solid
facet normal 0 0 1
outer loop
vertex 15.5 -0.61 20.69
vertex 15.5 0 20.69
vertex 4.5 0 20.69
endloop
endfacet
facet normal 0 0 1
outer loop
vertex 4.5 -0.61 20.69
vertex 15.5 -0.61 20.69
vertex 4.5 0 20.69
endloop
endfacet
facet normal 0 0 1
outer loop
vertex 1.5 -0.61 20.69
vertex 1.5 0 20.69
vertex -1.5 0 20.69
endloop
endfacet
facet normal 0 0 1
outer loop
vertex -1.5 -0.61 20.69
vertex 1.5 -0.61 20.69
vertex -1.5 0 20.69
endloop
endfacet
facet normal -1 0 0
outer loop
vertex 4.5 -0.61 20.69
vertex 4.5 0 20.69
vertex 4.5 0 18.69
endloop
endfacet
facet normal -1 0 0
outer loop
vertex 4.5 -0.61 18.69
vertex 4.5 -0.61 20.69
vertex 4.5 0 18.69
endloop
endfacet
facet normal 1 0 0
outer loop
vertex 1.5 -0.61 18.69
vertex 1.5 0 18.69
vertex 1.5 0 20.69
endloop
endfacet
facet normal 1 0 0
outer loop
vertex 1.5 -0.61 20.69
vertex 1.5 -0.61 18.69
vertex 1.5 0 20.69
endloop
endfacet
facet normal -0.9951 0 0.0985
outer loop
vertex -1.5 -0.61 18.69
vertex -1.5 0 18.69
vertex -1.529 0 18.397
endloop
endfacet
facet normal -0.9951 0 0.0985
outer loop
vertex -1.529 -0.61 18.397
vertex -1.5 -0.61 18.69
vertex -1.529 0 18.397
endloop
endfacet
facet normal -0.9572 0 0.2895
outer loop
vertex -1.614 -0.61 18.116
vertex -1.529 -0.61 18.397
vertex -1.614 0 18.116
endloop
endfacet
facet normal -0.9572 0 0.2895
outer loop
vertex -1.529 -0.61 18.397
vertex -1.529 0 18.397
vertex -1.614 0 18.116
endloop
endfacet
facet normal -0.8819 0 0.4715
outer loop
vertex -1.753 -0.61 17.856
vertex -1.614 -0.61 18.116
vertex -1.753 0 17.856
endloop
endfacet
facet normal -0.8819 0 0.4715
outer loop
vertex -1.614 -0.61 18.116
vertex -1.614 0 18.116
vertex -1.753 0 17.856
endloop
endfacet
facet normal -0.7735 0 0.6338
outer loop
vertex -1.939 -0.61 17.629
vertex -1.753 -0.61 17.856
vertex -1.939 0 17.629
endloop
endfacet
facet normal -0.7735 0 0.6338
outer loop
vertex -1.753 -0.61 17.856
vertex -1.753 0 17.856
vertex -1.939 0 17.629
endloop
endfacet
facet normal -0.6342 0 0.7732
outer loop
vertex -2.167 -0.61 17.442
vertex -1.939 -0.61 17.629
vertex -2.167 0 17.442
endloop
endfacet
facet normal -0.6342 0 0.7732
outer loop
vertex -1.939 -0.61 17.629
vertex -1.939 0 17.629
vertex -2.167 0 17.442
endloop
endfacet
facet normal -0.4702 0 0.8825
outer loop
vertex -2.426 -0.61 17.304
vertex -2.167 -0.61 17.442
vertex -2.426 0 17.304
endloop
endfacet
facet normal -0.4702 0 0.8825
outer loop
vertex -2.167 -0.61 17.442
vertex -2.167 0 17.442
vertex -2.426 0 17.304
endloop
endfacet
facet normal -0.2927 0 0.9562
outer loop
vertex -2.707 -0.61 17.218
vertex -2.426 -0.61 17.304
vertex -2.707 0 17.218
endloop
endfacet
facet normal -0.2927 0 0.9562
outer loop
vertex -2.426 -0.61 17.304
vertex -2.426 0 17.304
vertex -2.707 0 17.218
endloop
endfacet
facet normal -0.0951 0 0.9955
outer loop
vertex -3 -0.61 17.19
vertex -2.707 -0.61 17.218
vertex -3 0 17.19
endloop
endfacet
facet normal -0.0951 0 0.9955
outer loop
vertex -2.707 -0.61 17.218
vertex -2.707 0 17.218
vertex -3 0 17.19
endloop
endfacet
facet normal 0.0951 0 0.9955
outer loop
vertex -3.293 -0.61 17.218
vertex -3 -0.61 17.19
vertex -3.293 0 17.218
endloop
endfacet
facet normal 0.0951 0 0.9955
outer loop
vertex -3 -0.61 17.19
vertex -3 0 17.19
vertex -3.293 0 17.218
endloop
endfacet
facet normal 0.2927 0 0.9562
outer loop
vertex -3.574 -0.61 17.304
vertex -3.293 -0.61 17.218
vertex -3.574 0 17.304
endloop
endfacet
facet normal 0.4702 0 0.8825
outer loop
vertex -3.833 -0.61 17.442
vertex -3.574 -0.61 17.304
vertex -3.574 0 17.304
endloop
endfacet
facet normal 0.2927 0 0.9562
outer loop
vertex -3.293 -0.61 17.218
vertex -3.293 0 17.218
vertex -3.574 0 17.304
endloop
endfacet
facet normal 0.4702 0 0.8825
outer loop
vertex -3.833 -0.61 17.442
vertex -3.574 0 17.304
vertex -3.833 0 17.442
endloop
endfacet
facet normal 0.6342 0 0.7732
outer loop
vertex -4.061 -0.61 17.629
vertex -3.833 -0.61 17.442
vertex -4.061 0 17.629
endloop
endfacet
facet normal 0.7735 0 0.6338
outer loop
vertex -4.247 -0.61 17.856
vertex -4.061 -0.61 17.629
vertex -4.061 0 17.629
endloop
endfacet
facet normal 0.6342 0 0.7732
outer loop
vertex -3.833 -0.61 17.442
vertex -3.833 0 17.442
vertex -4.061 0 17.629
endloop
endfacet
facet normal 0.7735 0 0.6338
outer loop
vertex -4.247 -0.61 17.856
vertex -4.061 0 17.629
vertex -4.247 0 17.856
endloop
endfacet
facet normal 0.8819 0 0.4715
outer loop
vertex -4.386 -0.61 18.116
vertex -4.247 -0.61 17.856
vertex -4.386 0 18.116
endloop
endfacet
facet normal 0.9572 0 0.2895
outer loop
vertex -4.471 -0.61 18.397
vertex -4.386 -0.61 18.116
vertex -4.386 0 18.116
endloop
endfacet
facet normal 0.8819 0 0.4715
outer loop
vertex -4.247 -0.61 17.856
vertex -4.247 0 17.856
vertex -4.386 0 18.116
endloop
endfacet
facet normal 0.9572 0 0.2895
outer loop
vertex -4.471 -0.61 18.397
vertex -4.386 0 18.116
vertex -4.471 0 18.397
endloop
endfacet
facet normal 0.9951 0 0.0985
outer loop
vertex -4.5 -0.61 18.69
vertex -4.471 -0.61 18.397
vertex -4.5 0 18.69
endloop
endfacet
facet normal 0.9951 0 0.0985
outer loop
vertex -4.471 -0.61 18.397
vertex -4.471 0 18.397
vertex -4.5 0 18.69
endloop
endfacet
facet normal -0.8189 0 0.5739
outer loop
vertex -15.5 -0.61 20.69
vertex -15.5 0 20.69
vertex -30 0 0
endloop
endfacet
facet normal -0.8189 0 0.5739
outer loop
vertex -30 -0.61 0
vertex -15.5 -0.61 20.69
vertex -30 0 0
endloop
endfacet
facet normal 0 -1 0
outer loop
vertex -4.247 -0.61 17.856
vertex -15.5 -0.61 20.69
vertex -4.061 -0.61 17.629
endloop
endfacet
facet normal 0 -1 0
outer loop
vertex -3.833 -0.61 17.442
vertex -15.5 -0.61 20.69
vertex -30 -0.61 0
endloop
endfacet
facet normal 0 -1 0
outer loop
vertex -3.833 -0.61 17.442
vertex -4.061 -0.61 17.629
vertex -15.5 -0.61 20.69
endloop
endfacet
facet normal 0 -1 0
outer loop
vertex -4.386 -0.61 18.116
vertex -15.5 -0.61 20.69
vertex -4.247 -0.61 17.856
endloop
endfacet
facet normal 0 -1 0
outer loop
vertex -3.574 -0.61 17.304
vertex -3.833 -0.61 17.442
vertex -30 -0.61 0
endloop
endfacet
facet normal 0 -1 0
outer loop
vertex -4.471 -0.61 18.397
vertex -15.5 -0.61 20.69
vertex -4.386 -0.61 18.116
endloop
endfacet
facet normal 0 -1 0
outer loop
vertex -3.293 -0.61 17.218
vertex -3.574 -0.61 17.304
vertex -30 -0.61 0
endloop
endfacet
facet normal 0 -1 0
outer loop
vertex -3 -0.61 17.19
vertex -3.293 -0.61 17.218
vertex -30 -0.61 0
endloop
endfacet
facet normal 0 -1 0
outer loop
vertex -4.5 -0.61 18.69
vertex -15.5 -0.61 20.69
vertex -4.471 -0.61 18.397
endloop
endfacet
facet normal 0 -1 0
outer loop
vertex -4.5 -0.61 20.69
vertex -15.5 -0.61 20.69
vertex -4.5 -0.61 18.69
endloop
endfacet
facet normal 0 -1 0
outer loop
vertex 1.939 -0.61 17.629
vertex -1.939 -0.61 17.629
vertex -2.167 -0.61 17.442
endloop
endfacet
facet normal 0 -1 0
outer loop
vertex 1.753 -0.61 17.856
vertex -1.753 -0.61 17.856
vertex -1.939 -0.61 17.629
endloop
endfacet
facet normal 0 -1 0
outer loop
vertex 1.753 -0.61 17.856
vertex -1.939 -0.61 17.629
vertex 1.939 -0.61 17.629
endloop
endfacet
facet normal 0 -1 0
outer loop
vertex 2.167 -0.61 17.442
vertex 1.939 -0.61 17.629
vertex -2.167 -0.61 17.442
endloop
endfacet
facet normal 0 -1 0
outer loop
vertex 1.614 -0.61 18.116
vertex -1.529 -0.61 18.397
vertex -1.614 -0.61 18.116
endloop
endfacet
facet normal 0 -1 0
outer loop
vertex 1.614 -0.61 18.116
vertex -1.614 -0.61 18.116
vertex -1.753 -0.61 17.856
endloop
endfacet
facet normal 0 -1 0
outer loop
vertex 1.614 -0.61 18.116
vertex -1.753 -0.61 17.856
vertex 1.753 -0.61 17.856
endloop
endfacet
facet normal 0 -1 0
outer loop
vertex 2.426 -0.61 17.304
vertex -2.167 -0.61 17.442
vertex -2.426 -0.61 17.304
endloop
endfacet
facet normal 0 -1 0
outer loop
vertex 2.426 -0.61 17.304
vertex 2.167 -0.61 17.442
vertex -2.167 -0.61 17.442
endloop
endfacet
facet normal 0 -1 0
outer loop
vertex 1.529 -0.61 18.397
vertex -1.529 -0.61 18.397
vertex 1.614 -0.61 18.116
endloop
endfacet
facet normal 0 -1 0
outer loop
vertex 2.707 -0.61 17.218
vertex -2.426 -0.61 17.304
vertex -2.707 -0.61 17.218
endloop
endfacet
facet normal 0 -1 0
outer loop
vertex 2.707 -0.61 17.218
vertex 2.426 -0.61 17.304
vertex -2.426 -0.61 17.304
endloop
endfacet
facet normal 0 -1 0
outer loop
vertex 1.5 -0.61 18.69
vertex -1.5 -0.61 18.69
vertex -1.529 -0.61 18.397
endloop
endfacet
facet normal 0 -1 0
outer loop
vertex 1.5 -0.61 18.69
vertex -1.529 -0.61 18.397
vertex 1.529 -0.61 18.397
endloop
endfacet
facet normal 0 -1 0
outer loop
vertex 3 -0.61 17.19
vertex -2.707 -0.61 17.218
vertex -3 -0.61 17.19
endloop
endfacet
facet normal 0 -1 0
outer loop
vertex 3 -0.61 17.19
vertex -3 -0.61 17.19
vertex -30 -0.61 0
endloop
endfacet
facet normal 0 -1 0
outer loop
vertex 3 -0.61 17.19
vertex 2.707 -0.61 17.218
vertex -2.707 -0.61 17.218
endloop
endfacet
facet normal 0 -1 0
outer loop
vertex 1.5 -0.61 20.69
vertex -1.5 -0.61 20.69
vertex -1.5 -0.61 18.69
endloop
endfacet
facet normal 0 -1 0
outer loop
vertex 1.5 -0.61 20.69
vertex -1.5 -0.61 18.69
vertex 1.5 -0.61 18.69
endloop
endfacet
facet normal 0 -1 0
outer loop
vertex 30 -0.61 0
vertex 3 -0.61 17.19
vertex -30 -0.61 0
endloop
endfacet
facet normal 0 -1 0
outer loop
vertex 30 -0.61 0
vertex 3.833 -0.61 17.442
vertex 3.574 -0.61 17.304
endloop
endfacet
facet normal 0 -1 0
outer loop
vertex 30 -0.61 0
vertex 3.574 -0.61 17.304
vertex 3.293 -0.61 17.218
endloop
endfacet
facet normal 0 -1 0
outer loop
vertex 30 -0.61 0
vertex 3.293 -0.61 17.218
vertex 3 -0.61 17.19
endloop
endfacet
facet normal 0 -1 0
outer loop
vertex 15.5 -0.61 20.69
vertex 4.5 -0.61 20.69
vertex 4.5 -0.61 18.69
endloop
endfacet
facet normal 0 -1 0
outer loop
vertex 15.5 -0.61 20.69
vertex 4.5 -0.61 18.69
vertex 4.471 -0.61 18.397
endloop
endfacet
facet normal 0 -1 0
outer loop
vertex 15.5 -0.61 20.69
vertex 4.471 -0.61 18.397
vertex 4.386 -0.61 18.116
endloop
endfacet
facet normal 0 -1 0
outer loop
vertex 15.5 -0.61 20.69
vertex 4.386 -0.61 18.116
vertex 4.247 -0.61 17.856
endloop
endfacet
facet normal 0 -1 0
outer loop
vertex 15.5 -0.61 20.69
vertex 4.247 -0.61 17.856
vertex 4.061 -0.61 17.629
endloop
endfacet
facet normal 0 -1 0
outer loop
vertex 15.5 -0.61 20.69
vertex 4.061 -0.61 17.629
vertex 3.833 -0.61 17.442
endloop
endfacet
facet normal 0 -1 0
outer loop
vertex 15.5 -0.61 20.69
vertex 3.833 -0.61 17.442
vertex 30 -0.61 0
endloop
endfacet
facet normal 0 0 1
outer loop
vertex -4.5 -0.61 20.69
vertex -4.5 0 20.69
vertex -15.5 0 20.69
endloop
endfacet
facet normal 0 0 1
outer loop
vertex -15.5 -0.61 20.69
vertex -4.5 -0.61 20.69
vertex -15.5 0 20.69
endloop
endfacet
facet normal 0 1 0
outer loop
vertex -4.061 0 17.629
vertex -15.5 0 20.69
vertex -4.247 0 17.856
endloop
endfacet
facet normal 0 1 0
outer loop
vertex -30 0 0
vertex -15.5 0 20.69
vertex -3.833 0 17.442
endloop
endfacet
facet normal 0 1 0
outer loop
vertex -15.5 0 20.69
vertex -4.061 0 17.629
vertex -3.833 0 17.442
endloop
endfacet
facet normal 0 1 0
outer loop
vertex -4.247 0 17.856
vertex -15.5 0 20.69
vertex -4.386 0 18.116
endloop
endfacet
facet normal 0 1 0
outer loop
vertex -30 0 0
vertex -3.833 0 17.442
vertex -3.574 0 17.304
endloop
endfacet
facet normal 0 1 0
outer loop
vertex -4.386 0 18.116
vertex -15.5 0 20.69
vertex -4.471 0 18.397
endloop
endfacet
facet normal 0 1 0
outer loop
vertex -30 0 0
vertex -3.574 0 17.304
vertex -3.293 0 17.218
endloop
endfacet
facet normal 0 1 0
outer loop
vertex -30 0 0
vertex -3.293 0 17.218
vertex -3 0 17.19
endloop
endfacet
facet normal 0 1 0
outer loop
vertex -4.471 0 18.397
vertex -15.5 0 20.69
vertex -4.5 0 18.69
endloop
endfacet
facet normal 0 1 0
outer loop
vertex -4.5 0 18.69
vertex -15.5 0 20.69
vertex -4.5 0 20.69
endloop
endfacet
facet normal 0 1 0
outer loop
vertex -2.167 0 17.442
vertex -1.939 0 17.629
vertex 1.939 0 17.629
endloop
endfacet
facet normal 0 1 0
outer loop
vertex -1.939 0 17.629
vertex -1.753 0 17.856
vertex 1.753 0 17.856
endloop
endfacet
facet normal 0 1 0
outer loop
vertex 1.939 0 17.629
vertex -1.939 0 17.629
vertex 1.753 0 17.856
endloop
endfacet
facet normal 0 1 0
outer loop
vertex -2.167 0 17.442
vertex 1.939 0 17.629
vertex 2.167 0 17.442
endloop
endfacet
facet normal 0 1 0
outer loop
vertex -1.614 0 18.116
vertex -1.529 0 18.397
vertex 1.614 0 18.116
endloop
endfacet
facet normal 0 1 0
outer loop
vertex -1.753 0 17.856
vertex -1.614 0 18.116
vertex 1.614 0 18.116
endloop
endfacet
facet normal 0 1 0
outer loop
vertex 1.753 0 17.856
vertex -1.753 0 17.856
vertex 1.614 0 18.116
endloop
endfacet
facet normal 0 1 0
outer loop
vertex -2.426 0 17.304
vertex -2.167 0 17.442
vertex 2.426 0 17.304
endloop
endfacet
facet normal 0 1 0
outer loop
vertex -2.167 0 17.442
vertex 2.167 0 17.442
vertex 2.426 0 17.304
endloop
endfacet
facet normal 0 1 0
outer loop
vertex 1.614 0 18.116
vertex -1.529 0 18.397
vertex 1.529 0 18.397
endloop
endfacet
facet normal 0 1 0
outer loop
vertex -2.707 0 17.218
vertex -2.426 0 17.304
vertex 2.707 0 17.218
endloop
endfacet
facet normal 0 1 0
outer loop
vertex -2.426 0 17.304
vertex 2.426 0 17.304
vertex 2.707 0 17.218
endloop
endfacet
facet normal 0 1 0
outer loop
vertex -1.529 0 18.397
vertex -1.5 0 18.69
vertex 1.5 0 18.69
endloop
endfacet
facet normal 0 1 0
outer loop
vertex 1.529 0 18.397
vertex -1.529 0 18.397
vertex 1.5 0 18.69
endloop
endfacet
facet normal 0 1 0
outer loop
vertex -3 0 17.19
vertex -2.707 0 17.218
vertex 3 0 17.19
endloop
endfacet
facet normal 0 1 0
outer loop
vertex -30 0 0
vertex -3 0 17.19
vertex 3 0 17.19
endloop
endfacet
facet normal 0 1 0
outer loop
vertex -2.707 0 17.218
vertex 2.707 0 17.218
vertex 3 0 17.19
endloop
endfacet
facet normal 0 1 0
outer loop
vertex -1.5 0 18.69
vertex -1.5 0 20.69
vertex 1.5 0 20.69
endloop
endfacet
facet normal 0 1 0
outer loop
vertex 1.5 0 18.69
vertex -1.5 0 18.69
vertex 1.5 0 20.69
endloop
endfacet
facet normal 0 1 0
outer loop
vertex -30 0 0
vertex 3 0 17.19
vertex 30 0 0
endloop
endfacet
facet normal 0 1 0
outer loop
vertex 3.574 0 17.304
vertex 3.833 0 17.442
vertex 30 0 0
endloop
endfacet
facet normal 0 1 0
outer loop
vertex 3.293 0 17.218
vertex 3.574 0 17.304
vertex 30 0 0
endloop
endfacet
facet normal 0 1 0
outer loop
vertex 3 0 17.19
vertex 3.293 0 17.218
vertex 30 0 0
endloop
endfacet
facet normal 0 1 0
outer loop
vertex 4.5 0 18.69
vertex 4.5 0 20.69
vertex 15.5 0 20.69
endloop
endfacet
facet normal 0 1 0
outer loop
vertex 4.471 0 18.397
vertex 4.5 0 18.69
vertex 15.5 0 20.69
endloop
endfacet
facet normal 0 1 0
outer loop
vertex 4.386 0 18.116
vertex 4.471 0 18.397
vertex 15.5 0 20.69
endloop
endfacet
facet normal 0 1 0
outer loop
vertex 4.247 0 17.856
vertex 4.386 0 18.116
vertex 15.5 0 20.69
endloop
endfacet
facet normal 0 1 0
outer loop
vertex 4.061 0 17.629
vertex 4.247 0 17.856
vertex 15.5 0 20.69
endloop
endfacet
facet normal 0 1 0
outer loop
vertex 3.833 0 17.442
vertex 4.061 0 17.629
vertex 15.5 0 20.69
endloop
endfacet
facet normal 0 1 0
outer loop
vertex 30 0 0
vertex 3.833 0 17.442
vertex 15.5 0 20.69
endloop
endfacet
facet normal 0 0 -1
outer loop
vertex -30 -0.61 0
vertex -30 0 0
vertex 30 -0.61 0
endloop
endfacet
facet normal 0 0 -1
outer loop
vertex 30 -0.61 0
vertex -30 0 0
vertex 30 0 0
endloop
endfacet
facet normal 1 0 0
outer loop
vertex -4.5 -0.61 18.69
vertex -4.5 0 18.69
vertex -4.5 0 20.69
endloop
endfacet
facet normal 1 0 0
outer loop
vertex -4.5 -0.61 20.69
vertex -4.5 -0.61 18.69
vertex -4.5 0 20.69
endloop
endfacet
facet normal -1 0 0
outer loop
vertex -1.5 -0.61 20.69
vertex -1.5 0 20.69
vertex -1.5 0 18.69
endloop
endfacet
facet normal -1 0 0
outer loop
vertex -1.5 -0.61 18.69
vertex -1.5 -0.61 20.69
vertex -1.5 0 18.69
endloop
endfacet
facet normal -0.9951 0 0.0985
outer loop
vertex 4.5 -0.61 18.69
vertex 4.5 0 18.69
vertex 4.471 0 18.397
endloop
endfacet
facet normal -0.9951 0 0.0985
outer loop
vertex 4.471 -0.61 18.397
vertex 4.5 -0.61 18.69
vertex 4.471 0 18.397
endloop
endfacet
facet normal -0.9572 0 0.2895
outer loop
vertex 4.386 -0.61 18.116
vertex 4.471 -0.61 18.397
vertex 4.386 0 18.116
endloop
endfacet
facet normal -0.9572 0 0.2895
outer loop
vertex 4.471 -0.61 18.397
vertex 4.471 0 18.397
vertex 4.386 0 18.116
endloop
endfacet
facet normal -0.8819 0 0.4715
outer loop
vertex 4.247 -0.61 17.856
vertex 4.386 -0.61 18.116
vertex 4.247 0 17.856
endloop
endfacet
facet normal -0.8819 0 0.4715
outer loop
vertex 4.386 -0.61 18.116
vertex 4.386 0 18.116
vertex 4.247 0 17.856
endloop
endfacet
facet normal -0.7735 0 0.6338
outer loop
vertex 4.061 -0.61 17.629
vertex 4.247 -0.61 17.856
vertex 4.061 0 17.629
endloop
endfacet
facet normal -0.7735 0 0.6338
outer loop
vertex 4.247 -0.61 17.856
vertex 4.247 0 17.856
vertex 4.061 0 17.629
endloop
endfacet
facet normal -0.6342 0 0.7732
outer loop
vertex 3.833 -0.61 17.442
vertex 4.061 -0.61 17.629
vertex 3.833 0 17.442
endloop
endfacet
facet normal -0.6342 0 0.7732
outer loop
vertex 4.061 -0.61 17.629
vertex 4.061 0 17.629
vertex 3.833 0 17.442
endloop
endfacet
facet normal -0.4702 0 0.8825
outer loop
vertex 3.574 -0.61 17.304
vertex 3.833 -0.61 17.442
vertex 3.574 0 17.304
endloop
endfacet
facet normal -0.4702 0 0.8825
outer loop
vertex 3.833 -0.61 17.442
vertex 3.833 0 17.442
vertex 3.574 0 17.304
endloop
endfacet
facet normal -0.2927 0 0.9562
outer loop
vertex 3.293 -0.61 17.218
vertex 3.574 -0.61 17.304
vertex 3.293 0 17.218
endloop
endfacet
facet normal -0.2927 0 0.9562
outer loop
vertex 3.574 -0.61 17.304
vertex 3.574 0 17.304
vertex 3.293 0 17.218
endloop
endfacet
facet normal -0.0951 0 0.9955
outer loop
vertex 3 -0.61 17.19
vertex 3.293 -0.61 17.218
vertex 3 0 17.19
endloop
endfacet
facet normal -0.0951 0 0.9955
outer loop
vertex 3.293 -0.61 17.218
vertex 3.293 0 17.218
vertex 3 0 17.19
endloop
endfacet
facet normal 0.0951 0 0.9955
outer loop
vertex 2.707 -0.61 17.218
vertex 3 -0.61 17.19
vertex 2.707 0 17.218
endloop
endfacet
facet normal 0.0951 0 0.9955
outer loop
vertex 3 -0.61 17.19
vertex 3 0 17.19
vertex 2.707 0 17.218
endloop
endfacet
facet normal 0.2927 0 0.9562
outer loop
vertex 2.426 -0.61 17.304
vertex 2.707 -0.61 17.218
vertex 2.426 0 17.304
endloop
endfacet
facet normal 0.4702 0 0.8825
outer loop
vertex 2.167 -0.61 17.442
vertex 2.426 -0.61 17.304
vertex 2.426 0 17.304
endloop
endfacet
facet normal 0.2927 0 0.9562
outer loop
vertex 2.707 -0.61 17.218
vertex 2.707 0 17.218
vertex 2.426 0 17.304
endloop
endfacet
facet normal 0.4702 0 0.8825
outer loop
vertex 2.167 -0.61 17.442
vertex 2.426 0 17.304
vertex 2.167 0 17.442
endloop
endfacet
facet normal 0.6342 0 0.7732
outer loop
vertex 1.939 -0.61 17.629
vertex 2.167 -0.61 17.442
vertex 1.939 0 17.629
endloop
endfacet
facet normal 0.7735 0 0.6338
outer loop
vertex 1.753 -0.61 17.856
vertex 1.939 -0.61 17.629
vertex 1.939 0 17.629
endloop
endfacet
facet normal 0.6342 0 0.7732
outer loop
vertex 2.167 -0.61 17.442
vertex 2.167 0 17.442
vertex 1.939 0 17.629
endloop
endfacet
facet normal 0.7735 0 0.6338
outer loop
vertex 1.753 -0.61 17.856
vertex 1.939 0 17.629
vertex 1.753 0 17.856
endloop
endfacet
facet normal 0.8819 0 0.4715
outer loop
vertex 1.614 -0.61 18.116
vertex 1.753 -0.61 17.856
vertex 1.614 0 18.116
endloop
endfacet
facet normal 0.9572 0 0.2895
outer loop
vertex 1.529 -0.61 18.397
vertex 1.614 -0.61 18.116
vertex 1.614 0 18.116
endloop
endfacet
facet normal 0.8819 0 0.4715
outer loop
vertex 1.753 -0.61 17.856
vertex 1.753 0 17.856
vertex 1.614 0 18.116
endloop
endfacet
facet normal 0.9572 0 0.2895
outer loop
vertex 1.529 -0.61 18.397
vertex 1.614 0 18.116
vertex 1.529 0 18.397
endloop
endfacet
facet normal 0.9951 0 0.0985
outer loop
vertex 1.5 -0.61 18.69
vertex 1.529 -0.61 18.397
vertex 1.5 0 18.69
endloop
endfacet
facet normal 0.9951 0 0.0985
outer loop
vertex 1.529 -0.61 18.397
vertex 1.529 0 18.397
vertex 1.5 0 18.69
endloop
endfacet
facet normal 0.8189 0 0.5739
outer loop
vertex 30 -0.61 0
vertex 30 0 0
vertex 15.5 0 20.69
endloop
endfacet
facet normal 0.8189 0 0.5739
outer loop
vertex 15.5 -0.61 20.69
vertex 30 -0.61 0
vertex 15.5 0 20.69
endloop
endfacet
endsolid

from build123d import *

# Parameters (mm, degrees)
F1_DEPTH = 0.61


with BuildPart() as f1:
    # F0 (on Front) → F1 (new body)
    with BuildSketch(Plane.XZ):
        with BuildLine():
            Line((-30, 0), (0, 0))
            Line((0, 0), (30.000002, 0))
            Line((30.000002, 0), (15.5, 20.689656))
            Line((15.5, 20.689656), (4.5, 20.689656))
            Line((4.5, 20.689656), (4.5, 18.689656))
            ThreePointArc((4.5, 18.689656), (3, 17.189656), (1.5, 18.689656))
            Line((1.5, 18.689656), (1.5, 20.689656))
            Line((1.5, 20.689656), (0, 20.689656))
            Line((0, 20.689656), (-1.5, 20.689656))
            Line((-1.5, 20.689656), (-1.5, 18.689656))
            ThreePointArc((-1.5, 18.689656), (-3, 17.189656), (-4.5, 18.689656))
            Line((-4.5, 18.689656), (-4.5, 20.689656))
            Line((-4.5, 20.689656), (-15.5, 20.689656))
            Line((-15.5, 20.689656), (-30, 0))
        make_face()
    extrude(amount=F1_DEPTH)


solid = f1.part
